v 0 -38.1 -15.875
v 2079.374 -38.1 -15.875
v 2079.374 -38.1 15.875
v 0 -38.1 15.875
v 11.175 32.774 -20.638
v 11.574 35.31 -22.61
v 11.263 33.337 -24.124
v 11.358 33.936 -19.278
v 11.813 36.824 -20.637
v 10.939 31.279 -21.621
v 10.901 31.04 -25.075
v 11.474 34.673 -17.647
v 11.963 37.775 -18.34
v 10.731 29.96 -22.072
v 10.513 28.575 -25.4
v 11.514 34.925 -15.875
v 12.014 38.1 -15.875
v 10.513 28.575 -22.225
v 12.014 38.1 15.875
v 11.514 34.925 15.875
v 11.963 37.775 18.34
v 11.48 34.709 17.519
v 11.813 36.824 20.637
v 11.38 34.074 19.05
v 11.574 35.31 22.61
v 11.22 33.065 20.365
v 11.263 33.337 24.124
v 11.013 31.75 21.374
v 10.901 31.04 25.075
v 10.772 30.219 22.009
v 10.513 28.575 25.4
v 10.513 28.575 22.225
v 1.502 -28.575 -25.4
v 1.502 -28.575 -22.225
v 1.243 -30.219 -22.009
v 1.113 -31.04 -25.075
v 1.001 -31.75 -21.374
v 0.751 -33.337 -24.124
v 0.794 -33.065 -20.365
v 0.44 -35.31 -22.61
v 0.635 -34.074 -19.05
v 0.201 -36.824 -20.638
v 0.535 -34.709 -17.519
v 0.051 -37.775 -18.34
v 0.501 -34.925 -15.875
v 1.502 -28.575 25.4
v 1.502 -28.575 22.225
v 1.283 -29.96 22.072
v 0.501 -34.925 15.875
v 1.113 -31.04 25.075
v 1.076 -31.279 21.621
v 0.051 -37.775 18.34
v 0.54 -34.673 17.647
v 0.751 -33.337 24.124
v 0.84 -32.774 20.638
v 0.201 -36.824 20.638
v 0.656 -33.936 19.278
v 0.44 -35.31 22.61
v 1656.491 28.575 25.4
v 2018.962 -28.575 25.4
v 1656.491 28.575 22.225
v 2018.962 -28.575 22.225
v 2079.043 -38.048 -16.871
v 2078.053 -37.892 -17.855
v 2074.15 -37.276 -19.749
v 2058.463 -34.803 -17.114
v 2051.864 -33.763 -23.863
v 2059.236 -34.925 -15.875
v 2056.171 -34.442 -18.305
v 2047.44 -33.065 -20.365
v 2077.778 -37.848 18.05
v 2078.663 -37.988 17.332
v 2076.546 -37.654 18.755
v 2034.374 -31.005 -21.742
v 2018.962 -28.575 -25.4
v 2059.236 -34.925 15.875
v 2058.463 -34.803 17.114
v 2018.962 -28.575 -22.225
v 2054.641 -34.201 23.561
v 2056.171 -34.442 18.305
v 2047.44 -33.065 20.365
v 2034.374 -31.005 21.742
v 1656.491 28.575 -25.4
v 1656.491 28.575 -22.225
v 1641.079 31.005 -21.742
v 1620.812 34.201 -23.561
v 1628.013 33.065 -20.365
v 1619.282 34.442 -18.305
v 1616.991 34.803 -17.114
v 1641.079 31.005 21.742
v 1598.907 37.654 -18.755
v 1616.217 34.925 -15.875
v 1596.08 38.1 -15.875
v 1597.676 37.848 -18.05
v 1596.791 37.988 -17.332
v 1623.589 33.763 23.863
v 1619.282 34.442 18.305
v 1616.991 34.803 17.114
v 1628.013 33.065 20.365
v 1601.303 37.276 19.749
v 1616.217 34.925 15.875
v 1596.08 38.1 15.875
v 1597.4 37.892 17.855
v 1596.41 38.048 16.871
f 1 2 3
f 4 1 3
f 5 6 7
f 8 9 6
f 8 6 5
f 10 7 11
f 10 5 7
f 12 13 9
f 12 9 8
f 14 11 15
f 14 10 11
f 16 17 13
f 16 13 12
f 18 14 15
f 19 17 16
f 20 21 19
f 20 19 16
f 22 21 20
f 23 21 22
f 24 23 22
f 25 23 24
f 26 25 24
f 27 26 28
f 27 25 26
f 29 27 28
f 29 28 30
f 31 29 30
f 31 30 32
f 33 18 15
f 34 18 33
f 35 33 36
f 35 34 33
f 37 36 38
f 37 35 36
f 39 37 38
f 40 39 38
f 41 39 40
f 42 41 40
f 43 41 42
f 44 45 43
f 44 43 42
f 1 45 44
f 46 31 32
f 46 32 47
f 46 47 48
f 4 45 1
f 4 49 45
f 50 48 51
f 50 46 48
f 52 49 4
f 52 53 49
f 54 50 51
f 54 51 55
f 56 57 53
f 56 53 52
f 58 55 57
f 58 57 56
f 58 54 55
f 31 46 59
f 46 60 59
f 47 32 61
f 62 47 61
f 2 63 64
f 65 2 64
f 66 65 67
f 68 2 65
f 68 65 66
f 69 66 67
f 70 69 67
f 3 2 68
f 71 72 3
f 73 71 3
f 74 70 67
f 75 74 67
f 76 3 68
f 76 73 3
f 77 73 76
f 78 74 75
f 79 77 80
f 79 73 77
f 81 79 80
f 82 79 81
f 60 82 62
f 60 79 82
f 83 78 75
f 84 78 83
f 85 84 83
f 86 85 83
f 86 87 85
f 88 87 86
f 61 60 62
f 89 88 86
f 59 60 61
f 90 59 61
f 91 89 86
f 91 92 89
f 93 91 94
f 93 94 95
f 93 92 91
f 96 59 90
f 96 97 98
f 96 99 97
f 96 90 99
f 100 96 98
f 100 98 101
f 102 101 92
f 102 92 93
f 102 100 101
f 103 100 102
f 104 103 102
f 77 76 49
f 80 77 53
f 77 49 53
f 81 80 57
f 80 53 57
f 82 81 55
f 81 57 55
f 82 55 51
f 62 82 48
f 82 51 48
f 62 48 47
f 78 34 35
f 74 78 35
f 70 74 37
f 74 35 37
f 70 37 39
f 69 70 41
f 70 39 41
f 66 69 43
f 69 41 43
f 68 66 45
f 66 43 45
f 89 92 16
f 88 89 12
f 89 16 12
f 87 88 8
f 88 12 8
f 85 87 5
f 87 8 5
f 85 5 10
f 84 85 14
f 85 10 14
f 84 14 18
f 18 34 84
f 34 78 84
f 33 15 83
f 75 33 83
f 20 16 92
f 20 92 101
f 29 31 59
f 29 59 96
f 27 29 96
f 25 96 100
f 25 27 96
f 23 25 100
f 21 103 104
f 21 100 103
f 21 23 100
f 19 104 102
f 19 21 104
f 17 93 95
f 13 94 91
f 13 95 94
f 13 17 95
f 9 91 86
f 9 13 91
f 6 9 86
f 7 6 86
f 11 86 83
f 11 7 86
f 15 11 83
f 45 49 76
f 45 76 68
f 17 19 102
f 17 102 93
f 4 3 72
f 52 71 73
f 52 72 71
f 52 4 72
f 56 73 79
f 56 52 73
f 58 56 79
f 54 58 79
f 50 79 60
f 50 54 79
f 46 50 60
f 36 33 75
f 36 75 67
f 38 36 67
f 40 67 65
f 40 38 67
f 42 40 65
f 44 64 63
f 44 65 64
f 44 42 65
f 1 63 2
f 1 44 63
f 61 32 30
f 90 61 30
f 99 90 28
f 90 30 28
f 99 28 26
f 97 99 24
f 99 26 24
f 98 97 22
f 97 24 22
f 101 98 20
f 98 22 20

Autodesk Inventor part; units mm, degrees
ref_plane "YZ Plane" through (0, 0, 0) normal (1, 0, 0) x (0, 1, 0)
ref_plane "XZ Plane" through (0, 0, 0) normal (0, 1, 0) x (-1, 0, 0)
ref_plane "XY Plane" through (0, 0, 0) normal (0, 0, 1) x (1, 0, 0)
sketch "Sketch1" plane through (0, 0, 0) normal (1, 0, 0) x (0, 1, 0)
  line L0 (-28.575, 25.4) -> (28.575, 25.4)
  line L1 (38.1, 15.875) -> (38.1, -15.875)
  line L2 (28.575, -25.4) -> (-28.575, -25.4)
  line L3 (-38.1, -15.875) -> (-38.1, 15.875)
  line L4 (-38.1, 25.4) -> (38.1, -25.4) construction
  line L5 (38.1, 25.4) -> (-38.1, -25.4) construction
  arc A0 (38.1, 15.875) -> (28.575, 25.4) centre (28.575, 15.875) ccw
  arc A1 (-28.575, 25.4) -> (-38.1, 15.875) centre (-28.575, 15.875) ccw
  arc A2 (-38.1, -15.875) -> (-28.575, -25.4) centre (-28.575, -15.875) ccw
  arc A3 (28.575, -25.4) -> (38.1, -15.875) centre (28.575, -15.875) ccw
  line L6 (34.925, -15.875) -> (34.925, 15.875)
  arc A4 (34.925, 15.875) -> (28.575, 22.225) centre (28.575, 15.875) ccw
  line L7 (28.575, 22.225) -> (-28.575, 22.225)
  arc A5 (-28.575, 22.225) -> (-34.925, 15.875) centre (-28.575, 15.875) ccw
  line L8 (-34.925, 15.875) -> (-34.925, -15.875)
  arc A6 (-34.925, -15.875) -> (-28.575, -22.225) centre (-28.575, -15.875) ccw
  line L9 (-28.575, -22.225) -> (28.575, -22.225)
  arc A7 (28.575, -22.225) -> (34.925, -15.875) centre (28.575, -15.875) ccw
  point P0 (0, 0)
  dimension "d0" = 76.2
  dimension "d1" = 50.8
  dimension "d2" = 9.525
  dimension "d3" = 3.175
extrude "Extrusion1" add sketch "Sketch1" along normal blind 2079.3737
sketch "Sketch2" plane through (0, -28.575, 25.4) normal (0, 0, 1) x (1, 0, 0)
  line L0 (0, -9.525) -> (2079.3737, -9.525) projected
  line L1 (0, -9.525) -> (0, 66.675)
  line L2 (0, 66.675) -> (12.0143, 66.675)
  line L3 (0, 66.675) -> (2079.3737, 66.675) projected
  line L4 (0, -9.525) -> (0, 0) projected
  line L5 (12.0143, 66.675) -> (0, -9.525)
  line L6 (2079.3737, -9.525) -> (1596.0795, 66.675)
  line L7 (1596.0795, 66.675) -> (2079.3737, 66.675)
  line L8 (2079.3737, 66.675) -> (2079.3737, -9.525)
  point P0 (0, 28.575)
  dimension "d6" = 8.96
  dimension "d7" = 8.96
extrude "Extrusion2" cut sketch "Sketch2" against normal through all contours L1 L2 L5 | L6 L3 L8
equation "\"d0\" = stockWidth"
equation "\"d1\" = stockHeight"
equation "\"d2\" = stockRad"
equation "\"d3\" = stockGuage"
equation "\"d4\" = sup2Len"
equation "\"d6\" = sup2Ang"
equation "\"d7\" = sup2Ang"
equation "\"height\" = 203.2"
equation "\"shaftDiam\" = 6.35"
equation "\"shaftSpace\" = 1.5875"
equation "\"stageSpace\" = 2.54"
equation "\"stageAngle\" = 15deg"
equation "\"stockHeight\" = 50.8"
equation "\"stockWidth\" = 76.2"
equation "\"stockRad\" = 9.525"
equation "\"stockGuage\" = 3.175"
equation "\"groundActu\" = 304.8"
equation "\"baseWidth\" = 1066.8"
equation "\"baseDepth\" = 254"
equation "\"capThickness\" = 3.175"
equation "\"sup1Len\" = 660.4"
equation "\"sup1Ang\" = 22.619865deg"
equation "\"sup2Len\" = 2079.37366"
equation "\"sup2Ang\" = 8.95995deg"
equation "\"supVertLen\" = 955.13561"
equation "\"supSideAng\" = 19.376933deg"
equation "\"supSideLen\" = 1531.12879"
equation "\"FlangeDiam\" = 12.7"
equation "\"bearingDiam\" = 9.5504"
equation "\"FlangeDepth\" = 1.5875"
equation "\"smallFilet\" = 0.39687"
equation "\"thickness\" = 12.7"
equation "\"ringDiam\" = 96.46608"
properties part number "support 2" material "Aluminum 6061"
